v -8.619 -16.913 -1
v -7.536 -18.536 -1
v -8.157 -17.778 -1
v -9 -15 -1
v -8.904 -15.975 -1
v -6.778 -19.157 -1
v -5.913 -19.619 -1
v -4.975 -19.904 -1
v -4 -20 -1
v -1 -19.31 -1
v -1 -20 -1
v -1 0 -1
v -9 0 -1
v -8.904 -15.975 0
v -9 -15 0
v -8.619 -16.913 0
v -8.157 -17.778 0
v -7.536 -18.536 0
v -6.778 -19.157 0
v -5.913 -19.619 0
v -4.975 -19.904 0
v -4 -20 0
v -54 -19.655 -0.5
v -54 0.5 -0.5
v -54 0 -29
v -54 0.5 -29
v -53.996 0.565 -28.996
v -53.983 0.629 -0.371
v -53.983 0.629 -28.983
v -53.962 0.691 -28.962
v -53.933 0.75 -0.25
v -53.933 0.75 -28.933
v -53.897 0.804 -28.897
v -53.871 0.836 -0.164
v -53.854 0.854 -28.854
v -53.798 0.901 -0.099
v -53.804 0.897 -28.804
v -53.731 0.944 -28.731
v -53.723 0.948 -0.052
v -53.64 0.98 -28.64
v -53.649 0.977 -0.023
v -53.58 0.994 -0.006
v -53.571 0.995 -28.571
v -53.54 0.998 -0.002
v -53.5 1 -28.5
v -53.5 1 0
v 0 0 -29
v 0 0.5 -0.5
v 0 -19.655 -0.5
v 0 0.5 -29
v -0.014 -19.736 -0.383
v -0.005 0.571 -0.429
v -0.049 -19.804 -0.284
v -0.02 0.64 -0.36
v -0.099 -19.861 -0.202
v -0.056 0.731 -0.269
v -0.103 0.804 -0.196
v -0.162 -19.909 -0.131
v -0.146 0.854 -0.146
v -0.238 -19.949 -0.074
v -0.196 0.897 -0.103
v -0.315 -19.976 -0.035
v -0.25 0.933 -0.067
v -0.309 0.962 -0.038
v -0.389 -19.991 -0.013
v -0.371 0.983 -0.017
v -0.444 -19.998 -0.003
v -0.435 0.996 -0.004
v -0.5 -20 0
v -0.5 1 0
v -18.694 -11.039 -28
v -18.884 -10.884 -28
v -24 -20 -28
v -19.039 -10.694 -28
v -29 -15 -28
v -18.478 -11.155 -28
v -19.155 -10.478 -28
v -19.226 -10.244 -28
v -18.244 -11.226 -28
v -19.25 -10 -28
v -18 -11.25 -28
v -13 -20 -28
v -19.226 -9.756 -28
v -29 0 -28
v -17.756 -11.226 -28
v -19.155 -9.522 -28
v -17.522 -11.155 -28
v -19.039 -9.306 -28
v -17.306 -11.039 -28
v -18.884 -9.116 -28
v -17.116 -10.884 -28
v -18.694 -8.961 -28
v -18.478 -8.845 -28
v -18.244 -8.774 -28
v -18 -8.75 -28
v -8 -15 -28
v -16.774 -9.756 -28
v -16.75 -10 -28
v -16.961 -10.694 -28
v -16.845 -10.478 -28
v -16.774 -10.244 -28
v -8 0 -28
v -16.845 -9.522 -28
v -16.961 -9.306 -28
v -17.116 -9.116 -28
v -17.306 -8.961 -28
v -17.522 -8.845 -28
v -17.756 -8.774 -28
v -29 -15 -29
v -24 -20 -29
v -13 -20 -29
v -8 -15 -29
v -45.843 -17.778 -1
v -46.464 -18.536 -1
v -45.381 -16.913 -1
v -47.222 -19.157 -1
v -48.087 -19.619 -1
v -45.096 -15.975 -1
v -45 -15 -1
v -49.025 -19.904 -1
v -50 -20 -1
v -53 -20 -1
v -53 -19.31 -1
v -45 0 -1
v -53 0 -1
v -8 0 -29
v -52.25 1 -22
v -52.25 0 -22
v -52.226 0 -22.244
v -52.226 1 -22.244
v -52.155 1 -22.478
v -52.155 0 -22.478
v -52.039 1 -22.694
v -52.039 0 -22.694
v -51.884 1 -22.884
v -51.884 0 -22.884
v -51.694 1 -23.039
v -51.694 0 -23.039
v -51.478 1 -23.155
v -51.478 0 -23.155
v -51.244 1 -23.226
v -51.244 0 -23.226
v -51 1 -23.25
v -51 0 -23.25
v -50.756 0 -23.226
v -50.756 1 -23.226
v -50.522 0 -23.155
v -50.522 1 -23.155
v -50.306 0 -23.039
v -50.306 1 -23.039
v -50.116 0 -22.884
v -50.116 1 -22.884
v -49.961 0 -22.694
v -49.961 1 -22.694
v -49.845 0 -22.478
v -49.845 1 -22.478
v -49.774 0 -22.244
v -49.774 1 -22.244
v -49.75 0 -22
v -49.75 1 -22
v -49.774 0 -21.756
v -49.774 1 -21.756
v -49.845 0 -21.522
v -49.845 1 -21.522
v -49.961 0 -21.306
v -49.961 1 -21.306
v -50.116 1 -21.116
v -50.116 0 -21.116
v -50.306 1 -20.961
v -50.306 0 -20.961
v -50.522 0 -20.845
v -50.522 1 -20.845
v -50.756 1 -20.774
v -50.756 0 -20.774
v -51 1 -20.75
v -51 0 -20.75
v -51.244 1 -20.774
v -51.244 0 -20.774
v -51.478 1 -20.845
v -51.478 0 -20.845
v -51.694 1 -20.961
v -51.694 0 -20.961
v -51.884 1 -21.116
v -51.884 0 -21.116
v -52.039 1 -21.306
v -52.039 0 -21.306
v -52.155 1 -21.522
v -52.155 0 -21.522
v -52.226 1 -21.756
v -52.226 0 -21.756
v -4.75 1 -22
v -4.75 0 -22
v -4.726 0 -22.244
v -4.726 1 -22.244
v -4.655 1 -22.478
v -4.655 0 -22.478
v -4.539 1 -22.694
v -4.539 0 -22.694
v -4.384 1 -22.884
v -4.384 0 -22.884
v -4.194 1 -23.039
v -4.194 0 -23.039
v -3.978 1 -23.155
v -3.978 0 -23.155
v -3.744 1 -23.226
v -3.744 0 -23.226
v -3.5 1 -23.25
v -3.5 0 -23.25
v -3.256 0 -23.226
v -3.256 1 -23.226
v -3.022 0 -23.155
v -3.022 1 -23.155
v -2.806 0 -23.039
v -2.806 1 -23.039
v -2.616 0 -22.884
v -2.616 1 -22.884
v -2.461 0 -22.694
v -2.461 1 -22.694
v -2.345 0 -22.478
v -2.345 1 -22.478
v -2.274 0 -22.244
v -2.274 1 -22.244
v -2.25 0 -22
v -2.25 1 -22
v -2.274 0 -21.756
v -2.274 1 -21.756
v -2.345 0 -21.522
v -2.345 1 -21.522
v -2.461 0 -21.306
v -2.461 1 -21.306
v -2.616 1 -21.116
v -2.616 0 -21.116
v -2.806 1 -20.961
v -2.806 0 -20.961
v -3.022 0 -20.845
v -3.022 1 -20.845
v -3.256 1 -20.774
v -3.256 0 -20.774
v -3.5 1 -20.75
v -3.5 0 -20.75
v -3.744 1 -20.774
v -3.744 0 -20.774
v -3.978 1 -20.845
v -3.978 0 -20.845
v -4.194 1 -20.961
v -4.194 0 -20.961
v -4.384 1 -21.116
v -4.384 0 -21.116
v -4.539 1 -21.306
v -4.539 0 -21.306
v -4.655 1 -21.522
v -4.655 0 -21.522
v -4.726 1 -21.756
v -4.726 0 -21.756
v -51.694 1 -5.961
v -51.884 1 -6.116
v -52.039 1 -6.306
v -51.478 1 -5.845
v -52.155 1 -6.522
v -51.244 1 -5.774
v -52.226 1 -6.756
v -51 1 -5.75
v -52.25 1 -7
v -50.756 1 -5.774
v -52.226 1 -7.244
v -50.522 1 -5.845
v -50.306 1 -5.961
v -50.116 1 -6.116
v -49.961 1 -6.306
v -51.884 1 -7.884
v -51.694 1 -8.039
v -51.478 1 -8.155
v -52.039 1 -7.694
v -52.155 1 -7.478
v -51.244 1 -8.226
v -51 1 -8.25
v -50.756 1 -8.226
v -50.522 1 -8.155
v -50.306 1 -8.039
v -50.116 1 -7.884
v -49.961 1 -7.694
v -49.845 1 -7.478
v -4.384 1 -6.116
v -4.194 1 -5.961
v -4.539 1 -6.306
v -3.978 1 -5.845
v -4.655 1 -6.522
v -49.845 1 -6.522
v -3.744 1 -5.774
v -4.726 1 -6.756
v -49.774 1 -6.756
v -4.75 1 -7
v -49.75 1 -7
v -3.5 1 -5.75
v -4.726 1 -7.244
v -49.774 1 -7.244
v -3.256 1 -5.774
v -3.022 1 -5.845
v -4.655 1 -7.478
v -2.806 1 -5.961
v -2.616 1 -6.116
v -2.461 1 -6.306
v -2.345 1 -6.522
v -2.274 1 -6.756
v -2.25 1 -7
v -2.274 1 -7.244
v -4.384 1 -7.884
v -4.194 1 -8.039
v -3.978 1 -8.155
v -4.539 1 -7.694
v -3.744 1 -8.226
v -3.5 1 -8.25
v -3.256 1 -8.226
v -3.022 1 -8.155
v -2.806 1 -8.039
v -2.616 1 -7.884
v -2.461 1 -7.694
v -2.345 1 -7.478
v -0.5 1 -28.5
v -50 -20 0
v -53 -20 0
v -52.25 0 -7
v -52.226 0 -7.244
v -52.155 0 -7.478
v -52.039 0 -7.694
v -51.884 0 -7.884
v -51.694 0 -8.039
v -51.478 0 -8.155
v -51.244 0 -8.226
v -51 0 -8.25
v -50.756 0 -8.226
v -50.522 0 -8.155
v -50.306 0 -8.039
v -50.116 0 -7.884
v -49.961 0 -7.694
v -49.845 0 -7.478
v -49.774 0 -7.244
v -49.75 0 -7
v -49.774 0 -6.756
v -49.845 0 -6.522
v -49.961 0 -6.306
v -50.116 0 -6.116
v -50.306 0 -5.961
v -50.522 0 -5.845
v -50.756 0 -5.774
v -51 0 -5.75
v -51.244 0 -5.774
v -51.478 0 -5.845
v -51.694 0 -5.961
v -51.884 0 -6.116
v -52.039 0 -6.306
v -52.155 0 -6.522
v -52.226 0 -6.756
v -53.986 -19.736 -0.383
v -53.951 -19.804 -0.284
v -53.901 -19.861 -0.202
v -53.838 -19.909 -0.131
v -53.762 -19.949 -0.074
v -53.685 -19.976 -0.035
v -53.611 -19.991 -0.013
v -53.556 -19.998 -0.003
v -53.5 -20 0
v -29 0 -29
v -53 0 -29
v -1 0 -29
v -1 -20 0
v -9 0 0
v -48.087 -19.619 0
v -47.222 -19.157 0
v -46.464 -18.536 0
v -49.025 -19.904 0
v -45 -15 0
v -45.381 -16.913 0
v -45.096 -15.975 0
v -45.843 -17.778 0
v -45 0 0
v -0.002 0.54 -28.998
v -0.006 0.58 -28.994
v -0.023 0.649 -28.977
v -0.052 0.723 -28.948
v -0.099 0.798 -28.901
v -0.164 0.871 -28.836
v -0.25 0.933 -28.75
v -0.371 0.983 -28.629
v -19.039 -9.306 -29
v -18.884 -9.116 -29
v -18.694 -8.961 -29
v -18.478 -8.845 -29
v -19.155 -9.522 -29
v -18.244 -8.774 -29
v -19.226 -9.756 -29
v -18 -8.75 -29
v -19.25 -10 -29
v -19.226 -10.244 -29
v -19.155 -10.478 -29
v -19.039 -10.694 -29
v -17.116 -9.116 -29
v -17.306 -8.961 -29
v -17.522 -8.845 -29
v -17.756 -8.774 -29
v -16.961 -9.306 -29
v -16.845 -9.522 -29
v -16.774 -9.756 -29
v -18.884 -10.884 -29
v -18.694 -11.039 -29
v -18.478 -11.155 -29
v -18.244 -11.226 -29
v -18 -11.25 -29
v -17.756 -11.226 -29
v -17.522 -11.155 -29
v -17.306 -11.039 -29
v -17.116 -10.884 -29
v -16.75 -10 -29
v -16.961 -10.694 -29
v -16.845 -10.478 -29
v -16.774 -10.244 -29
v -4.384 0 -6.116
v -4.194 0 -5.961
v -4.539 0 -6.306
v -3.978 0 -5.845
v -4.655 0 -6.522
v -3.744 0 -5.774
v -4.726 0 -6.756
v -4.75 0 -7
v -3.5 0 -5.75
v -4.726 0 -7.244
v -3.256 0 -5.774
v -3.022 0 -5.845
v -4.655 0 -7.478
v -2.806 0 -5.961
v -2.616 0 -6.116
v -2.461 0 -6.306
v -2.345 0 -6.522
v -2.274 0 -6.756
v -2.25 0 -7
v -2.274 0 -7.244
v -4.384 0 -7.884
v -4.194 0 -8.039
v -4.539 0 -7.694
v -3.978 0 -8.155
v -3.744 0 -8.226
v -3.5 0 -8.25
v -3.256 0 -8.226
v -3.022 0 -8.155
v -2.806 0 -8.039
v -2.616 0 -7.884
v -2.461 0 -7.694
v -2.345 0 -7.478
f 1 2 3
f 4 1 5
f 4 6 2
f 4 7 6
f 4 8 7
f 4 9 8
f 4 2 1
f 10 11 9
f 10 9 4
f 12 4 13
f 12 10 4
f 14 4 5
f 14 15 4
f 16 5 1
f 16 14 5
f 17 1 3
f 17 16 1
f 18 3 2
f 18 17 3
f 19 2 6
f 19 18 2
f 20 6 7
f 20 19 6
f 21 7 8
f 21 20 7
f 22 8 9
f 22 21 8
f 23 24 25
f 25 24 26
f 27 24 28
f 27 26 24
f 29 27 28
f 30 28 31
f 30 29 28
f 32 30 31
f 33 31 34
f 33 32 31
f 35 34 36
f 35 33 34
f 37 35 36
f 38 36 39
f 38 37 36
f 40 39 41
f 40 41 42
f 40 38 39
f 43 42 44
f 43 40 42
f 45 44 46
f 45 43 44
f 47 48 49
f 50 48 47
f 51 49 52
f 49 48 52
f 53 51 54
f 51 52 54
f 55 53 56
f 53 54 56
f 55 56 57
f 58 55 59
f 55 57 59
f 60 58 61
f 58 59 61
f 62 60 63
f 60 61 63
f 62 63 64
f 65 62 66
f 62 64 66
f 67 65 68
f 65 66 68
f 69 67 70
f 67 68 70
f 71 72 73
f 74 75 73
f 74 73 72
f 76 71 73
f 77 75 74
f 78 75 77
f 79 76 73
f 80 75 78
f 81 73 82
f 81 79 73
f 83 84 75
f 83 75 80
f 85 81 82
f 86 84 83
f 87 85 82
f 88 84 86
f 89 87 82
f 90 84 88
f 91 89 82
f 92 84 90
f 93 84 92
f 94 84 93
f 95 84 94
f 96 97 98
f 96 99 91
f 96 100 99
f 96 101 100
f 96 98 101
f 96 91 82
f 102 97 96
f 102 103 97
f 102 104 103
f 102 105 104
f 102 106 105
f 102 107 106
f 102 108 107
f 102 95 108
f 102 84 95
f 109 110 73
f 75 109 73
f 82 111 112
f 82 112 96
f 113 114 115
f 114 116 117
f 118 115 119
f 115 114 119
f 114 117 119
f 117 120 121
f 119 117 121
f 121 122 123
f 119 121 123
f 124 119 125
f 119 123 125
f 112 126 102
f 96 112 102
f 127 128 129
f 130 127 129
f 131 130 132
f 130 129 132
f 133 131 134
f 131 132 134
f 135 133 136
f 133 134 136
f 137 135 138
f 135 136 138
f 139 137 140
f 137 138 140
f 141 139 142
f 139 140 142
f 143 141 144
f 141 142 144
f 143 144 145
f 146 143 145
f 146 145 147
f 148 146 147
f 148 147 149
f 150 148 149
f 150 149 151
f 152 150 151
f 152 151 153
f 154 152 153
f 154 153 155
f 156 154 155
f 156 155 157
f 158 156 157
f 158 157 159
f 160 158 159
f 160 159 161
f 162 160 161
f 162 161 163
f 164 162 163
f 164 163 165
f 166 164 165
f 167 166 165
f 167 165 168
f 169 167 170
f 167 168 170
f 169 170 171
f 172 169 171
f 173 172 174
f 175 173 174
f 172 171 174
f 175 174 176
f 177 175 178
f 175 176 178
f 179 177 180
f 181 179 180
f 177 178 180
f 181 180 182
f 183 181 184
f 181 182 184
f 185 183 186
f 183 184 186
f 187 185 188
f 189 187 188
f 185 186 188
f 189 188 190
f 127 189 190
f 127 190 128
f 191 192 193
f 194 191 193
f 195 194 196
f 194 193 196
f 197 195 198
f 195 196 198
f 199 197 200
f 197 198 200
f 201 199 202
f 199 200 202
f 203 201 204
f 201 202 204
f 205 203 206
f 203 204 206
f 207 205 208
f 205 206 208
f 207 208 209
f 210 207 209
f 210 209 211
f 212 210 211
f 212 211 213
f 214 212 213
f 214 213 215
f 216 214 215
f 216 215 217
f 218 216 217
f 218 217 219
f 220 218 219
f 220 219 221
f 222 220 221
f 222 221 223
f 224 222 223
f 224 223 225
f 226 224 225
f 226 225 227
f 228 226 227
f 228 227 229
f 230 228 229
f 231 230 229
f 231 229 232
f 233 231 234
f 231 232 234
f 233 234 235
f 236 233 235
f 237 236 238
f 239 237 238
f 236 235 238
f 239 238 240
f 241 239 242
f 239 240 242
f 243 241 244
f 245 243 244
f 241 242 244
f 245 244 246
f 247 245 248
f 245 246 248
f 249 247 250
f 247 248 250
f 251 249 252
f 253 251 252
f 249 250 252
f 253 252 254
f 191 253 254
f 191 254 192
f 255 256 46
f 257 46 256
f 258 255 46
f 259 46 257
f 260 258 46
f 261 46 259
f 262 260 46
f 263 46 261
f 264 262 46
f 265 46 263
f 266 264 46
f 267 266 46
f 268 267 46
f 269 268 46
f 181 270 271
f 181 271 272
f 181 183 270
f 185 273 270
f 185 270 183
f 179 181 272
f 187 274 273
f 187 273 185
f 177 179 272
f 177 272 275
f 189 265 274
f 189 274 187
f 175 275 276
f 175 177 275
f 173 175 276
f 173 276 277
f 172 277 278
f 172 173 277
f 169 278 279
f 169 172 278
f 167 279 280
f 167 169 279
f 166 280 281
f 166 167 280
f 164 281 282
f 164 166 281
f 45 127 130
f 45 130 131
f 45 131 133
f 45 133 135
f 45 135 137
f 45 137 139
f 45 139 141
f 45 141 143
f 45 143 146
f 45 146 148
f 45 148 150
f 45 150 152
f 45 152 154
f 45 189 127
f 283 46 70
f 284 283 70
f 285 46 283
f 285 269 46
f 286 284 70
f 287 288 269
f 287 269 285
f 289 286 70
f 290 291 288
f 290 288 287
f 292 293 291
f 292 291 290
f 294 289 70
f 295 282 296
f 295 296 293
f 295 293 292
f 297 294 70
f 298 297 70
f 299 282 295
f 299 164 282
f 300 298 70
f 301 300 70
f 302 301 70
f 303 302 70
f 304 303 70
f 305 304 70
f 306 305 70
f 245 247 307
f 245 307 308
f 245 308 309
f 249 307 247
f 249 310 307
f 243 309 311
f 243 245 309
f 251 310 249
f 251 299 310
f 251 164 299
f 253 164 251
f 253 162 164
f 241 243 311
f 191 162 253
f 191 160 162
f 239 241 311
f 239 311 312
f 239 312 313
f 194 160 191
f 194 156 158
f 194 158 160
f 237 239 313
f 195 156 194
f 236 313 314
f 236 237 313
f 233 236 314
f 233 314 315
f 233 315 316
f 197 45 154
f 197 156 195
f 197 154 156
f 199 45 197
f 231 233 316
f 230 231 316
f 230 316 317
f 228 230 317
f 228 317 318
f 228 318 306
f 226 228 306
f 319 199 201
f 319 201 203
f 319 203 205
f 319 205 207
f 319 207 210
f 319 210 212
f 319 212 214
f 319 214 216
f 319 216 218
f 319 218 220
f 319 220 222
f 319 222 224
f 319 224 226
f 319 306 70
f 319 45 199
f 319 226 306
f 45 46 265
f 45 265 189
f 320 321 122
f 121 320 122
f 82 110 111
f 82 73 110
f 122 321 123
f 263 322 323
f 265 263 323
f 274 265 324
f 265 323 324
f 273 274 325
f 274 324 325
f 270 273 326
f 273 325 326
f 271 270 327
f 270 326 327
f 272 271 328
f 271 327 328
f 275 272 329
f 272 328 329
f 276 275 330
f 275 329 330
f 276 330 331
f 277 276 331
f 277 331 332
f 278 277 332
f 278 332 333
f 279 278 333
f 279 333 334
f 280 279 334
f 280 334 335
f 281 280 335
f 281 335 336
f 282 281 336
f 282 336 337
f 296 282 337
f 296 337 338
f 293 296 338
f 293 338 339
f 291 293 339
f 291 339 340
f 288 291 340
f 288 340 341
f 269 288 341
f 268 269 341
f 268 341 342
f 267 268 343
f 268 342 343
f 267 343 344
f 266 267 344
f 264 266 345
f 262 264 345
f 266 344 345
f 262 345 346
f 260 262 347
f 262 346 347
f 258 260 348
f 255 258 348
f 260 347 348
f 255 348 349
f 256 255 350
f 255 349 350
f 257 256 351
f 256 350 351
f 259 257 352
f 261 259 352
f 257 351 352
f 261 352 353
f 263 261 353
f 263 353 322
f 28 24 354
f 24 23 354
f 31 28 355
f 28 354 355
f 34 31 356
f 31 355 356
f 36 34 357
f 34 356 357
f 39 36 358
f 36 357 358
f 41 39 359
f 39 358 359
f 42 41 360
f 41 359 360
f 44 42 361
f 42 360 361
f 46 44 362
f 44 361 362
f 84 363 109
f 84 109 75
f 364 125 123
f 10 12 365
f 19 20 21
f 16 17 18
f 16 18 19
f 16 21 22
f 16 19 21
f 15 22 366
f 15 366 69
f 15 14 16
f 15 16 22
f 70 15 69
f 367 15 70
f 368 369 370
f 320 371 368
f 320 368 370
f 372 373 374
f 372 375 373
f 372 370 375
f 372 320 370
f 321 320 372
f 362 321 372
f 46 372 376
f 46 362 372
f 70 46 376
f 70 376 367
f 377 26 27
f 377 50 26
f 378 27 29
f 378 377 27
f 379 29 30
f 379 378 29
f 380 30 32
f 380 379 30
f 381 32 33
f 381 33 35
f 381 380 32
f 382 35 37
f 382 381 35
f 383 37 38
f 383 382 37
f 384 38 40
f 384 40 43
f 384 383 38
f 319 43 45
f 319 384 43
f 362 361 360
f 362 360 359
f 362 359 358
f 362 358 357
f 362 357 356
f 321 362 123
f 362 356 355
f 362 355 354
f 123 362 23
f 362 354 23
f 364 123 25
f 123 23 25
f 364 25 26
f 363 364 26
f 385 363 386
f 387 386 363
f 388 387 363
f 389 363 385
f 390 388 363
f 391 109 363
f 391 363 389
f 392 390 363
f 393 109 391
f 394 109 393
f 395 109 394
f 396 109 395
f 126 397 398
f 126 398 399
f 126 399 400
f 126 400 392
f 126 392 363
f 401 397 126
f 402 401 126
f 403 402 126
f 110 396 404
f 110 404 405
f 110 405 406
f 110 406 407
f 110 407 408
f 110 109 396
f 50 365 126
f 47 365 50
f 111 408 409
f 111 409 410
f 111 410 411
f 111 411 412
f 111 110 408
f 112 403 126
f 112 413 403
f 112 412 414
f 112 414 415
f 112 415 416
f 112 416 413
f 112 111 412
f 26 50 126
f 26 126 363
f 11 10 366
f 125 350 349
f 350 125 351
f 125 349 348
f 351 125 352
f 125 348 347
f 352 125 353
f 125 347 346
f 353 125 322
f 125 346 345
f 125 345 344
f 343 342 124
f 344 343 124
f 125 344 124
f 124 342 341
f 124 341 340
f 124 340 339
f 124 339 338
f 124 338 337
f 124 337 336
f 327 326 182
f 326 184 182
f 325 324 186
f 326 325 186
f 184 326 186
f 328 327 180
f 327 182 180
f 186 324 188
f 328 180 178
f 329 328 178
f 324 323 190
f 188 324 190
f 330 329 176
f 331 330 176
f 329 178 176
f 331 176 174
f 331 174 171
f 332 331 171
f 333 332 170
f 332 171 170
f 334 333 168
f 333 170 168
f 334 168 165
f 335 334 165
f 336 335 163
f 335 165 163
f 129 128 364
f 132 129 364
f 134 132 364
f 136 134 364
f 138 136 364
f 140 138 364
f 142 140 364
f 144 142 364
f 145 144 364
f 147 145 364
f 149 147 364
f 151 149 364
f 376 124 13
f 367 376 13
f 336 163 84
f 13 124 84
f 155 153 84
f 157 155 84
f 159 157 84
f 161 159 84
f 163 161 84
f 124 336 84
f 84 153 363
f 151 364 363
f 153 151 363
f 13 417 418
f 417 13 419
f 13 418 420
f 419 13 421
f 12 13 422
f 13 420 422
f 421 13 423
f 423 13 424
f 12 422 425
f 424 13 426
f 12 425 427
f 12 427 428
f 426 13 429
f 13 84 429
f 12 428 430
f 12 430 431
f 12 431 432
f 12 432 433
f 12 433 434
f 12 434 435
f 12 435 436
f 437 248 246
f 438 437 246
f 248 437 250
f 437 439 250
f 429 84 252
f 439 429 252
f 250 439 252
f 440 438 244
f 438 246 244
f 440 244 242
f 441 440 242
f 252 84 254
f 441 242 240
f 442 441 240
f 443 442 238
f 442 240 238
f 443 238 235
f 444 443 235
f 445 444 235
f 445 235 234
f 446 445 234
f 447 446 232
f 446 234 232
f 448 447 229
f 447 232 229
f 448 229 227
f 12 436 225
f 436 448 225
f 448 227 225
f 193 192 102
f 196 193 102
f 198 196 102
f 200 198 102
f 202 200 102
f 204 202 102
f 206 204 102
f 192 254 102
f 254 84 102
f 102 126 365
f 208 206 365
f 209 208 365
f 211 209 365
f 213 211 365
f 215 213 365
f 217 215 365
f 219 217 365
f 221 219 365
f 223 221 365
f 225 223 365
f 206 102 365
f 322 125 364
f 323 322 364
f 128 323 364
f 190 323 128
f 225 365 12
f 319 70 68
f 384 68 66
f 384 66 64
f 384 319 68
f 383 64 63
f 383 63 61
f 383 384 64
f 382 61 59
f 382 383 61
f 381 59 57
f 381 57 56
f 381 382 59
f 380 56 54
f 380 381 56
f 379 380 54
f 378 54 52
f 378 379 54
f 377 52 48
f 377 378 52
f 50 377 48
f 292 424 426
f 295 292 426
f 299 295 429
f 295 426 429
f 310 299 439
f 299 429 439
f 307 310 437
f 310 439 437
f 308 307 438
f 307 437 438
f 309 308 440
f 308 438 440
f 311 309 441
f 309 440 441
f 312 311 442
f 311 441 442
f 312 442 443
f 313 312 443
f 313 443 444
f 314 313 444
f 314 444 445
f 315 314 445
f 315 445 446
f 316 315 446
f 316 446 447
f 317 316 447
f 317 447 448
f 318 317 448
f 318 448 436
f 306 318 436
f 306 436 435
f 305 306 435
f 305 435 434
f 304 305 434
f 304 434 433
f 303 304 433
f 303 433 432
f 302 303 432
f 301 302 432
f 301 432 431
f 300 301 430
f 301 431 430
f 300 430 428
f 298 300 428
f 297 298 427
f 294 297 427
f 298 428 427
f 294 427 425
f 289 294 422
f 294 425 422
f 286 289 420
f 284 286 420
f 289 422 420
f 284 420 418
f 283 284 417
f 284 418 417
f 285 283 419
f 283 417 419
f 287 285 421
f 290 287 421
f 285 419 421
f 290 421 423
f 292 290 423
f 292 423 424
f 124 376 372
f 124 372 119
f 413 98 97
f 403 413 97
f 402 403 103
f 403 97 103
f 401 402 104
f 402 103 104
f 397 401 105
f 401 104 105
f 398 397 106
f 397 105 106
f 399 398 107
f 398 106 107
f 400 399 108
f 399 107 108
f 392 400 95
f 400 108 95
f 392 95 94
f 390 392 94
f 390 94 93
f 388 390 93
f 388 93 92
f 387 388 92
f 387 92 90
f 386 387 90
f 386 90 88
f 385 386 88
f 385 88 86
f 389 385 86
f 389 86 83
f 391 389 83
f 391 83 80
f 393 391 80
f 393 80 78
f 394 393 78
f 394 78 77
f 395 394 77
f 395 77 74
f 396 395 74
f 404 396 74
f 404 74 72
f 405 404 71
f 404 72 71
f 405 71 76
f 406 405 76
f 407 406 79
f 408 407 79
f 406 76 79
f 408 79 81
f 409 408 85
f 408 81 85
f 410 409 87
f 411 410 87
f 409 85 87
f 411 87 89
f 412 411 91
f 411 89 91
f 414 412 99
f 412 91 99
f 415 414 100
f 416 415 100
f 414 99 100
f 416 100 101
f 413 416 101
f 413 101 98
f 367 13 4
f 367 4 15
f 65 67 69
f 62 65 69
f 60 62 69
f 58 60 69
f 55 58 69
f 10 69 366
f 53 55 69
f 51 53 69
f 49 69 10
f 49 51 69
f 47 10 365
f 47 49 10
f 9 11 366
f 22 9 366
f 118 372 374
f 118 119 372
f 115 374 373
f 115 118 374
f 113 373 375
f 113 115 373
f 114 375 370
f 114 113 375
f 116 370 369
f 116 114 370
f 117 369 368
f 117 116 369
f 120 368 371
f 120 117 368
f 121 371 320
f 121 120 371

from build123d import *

# Parameters (mm, degrees)
SKETCH_1_W         = 54
SKETCH_1_H         = 29
EXTRUDE_1_DEPTH    = 1
EXTRUDE_2_DEPTH    = 1
EXTRUDE_3_DEPTH    = 1
SKETCH_4_W         = 1
SKETCH_4_H         = 20
EXTRUDE_4_DEPTH    = 8
SKETCH_5_W         = 1
SKETCH_5_H         = 20
EXTRUDE_5_DEPTH    = 8
SKETCH_6_W         = 21
SKETCH_6_H         = 1
EXTRUDE_6_DEPTH    = 20
HOLE_WIZARD_M3_1_D = 2.5
CHAMFER_1_SIZE     = 5
FILLET_1_R         = 0.5
FILLET_2_R         = 5
HOLE_WIZARD_M3_2_D = 2.5


with BuildPart() as part:
    # 草图1 → 凸台-拉伸1 (new body)
    with BuildSketch(Plane(origin=(0, 0, 0), x_dir=(1, 0, 0), z_dir=(0, 1, 0))):
        with Locations((-27, 14.5)):
            Rectangle(SKETCH_1_W, SKETCH_1_H)
    extrude(amount=EXTRUDE_1_DEPTH)

    # 草图2 → 凸台-拉伸2 (add)
    with BuildSketch(Plane.ZY.offset(54)):
        Polygon((-29, 0), (0, 0), (0, -20), align=None)
    extrude(amount=-EXTRUDE_2_DEPTH)

    # 草图3 → 凸台-拉伸3 (add)
    with BuildSketch(Plane(origin=(0, 0, 0), x_dir=(0, 0, -1), z_dir=(1, 0, 0))):
        Polygon((0, 0), (0, -20), (29, 0), align=None)
    extrude(amount=-EXTRUDE_3_DEPTH)

    # 草图4 → 凸台-拉伸4 (add)
    with BuildSketch(Plane.ZY.offset(1)):
        with Locations((-0.5, -10)):
            Rectangle(SKETCH_4_W, SKETCH_4_H)
    extrude(amount=EXTRUDE_4_DEPTH)

    # 草图5 → 凸台-拉伸5 (add)
    with BuildSketch(Plane(origin=(-53, 0, 0), x_dir=(0, 0, -1), z_dir=(1, 0, 0))):
        with Locations((0.5, -10)):
            Rectangle(SKETCH_5_W, SKETCH_5_H)
    extrude(amount=EXTRUDE_5_DEPTH)

    # 草图6 → 凸台-拉伸6 (add)
    with BuildSketch(Plane.XZ):
        with Locations((-18.5, -28.5)):
            Rectangle(SKETCH_6_W, SKETCH_6_H)
    extrude(amount=EXTRUDE_6_DEPTH)

    # M3 螺纹孔1 (through all)
    with Locations(Plane(origin=(0, 0, -29), x_dir=(-1, 0, 0), z_dir=(0, 0, -1))):
        with Locations((18, -10)):
            Hole(HOLE_WIZARD_M3_1_D / 2)

    # 倒角1
    chamfer_1_edges = [part.edges().sort_by_distance(p)[0] for p in [
        (-8, -20, -28.5),
        (-29, -20, -28.5),
    ]]
    chamfer(chamfer_1_edges, length=CHAMFER_1_SIZE)

    # 圆角1
    fillet_1_edges = [part.edges().sort_by_distance(p)[0] for p in [
        (-54, 1, -14.5),
        (0, 1, -14.5),
        (-27, 1, -29),
        (0, -9.5, 0),
        (-54, -9.5, 0),
    ]]
    fillet(fillet_1_edges, radius=FILLET_1_R)

    # 圆角2
    fillet_2_edges = [part.edges().sort_by_distance(p)[0] for p in [
        (-9, -20, -0.5),
        (-45, -20, -0.5),
    ]]
    fillet(fillet_2_edges, radius=FILLET_2_R)

    # M3 螺纹孔2 (through all)
    with Locations(Plane(origin=(0, 1, 0), x_dir=(1, 0, 0), z_dir=(0, 1, 0))):
        with Locations((-51, 22), (-51, 7), (-3.5, 7), (-3.5, 22)):
            Hole(HOLE_WIZARD_M3_2_D / 2)


solid = part.part
